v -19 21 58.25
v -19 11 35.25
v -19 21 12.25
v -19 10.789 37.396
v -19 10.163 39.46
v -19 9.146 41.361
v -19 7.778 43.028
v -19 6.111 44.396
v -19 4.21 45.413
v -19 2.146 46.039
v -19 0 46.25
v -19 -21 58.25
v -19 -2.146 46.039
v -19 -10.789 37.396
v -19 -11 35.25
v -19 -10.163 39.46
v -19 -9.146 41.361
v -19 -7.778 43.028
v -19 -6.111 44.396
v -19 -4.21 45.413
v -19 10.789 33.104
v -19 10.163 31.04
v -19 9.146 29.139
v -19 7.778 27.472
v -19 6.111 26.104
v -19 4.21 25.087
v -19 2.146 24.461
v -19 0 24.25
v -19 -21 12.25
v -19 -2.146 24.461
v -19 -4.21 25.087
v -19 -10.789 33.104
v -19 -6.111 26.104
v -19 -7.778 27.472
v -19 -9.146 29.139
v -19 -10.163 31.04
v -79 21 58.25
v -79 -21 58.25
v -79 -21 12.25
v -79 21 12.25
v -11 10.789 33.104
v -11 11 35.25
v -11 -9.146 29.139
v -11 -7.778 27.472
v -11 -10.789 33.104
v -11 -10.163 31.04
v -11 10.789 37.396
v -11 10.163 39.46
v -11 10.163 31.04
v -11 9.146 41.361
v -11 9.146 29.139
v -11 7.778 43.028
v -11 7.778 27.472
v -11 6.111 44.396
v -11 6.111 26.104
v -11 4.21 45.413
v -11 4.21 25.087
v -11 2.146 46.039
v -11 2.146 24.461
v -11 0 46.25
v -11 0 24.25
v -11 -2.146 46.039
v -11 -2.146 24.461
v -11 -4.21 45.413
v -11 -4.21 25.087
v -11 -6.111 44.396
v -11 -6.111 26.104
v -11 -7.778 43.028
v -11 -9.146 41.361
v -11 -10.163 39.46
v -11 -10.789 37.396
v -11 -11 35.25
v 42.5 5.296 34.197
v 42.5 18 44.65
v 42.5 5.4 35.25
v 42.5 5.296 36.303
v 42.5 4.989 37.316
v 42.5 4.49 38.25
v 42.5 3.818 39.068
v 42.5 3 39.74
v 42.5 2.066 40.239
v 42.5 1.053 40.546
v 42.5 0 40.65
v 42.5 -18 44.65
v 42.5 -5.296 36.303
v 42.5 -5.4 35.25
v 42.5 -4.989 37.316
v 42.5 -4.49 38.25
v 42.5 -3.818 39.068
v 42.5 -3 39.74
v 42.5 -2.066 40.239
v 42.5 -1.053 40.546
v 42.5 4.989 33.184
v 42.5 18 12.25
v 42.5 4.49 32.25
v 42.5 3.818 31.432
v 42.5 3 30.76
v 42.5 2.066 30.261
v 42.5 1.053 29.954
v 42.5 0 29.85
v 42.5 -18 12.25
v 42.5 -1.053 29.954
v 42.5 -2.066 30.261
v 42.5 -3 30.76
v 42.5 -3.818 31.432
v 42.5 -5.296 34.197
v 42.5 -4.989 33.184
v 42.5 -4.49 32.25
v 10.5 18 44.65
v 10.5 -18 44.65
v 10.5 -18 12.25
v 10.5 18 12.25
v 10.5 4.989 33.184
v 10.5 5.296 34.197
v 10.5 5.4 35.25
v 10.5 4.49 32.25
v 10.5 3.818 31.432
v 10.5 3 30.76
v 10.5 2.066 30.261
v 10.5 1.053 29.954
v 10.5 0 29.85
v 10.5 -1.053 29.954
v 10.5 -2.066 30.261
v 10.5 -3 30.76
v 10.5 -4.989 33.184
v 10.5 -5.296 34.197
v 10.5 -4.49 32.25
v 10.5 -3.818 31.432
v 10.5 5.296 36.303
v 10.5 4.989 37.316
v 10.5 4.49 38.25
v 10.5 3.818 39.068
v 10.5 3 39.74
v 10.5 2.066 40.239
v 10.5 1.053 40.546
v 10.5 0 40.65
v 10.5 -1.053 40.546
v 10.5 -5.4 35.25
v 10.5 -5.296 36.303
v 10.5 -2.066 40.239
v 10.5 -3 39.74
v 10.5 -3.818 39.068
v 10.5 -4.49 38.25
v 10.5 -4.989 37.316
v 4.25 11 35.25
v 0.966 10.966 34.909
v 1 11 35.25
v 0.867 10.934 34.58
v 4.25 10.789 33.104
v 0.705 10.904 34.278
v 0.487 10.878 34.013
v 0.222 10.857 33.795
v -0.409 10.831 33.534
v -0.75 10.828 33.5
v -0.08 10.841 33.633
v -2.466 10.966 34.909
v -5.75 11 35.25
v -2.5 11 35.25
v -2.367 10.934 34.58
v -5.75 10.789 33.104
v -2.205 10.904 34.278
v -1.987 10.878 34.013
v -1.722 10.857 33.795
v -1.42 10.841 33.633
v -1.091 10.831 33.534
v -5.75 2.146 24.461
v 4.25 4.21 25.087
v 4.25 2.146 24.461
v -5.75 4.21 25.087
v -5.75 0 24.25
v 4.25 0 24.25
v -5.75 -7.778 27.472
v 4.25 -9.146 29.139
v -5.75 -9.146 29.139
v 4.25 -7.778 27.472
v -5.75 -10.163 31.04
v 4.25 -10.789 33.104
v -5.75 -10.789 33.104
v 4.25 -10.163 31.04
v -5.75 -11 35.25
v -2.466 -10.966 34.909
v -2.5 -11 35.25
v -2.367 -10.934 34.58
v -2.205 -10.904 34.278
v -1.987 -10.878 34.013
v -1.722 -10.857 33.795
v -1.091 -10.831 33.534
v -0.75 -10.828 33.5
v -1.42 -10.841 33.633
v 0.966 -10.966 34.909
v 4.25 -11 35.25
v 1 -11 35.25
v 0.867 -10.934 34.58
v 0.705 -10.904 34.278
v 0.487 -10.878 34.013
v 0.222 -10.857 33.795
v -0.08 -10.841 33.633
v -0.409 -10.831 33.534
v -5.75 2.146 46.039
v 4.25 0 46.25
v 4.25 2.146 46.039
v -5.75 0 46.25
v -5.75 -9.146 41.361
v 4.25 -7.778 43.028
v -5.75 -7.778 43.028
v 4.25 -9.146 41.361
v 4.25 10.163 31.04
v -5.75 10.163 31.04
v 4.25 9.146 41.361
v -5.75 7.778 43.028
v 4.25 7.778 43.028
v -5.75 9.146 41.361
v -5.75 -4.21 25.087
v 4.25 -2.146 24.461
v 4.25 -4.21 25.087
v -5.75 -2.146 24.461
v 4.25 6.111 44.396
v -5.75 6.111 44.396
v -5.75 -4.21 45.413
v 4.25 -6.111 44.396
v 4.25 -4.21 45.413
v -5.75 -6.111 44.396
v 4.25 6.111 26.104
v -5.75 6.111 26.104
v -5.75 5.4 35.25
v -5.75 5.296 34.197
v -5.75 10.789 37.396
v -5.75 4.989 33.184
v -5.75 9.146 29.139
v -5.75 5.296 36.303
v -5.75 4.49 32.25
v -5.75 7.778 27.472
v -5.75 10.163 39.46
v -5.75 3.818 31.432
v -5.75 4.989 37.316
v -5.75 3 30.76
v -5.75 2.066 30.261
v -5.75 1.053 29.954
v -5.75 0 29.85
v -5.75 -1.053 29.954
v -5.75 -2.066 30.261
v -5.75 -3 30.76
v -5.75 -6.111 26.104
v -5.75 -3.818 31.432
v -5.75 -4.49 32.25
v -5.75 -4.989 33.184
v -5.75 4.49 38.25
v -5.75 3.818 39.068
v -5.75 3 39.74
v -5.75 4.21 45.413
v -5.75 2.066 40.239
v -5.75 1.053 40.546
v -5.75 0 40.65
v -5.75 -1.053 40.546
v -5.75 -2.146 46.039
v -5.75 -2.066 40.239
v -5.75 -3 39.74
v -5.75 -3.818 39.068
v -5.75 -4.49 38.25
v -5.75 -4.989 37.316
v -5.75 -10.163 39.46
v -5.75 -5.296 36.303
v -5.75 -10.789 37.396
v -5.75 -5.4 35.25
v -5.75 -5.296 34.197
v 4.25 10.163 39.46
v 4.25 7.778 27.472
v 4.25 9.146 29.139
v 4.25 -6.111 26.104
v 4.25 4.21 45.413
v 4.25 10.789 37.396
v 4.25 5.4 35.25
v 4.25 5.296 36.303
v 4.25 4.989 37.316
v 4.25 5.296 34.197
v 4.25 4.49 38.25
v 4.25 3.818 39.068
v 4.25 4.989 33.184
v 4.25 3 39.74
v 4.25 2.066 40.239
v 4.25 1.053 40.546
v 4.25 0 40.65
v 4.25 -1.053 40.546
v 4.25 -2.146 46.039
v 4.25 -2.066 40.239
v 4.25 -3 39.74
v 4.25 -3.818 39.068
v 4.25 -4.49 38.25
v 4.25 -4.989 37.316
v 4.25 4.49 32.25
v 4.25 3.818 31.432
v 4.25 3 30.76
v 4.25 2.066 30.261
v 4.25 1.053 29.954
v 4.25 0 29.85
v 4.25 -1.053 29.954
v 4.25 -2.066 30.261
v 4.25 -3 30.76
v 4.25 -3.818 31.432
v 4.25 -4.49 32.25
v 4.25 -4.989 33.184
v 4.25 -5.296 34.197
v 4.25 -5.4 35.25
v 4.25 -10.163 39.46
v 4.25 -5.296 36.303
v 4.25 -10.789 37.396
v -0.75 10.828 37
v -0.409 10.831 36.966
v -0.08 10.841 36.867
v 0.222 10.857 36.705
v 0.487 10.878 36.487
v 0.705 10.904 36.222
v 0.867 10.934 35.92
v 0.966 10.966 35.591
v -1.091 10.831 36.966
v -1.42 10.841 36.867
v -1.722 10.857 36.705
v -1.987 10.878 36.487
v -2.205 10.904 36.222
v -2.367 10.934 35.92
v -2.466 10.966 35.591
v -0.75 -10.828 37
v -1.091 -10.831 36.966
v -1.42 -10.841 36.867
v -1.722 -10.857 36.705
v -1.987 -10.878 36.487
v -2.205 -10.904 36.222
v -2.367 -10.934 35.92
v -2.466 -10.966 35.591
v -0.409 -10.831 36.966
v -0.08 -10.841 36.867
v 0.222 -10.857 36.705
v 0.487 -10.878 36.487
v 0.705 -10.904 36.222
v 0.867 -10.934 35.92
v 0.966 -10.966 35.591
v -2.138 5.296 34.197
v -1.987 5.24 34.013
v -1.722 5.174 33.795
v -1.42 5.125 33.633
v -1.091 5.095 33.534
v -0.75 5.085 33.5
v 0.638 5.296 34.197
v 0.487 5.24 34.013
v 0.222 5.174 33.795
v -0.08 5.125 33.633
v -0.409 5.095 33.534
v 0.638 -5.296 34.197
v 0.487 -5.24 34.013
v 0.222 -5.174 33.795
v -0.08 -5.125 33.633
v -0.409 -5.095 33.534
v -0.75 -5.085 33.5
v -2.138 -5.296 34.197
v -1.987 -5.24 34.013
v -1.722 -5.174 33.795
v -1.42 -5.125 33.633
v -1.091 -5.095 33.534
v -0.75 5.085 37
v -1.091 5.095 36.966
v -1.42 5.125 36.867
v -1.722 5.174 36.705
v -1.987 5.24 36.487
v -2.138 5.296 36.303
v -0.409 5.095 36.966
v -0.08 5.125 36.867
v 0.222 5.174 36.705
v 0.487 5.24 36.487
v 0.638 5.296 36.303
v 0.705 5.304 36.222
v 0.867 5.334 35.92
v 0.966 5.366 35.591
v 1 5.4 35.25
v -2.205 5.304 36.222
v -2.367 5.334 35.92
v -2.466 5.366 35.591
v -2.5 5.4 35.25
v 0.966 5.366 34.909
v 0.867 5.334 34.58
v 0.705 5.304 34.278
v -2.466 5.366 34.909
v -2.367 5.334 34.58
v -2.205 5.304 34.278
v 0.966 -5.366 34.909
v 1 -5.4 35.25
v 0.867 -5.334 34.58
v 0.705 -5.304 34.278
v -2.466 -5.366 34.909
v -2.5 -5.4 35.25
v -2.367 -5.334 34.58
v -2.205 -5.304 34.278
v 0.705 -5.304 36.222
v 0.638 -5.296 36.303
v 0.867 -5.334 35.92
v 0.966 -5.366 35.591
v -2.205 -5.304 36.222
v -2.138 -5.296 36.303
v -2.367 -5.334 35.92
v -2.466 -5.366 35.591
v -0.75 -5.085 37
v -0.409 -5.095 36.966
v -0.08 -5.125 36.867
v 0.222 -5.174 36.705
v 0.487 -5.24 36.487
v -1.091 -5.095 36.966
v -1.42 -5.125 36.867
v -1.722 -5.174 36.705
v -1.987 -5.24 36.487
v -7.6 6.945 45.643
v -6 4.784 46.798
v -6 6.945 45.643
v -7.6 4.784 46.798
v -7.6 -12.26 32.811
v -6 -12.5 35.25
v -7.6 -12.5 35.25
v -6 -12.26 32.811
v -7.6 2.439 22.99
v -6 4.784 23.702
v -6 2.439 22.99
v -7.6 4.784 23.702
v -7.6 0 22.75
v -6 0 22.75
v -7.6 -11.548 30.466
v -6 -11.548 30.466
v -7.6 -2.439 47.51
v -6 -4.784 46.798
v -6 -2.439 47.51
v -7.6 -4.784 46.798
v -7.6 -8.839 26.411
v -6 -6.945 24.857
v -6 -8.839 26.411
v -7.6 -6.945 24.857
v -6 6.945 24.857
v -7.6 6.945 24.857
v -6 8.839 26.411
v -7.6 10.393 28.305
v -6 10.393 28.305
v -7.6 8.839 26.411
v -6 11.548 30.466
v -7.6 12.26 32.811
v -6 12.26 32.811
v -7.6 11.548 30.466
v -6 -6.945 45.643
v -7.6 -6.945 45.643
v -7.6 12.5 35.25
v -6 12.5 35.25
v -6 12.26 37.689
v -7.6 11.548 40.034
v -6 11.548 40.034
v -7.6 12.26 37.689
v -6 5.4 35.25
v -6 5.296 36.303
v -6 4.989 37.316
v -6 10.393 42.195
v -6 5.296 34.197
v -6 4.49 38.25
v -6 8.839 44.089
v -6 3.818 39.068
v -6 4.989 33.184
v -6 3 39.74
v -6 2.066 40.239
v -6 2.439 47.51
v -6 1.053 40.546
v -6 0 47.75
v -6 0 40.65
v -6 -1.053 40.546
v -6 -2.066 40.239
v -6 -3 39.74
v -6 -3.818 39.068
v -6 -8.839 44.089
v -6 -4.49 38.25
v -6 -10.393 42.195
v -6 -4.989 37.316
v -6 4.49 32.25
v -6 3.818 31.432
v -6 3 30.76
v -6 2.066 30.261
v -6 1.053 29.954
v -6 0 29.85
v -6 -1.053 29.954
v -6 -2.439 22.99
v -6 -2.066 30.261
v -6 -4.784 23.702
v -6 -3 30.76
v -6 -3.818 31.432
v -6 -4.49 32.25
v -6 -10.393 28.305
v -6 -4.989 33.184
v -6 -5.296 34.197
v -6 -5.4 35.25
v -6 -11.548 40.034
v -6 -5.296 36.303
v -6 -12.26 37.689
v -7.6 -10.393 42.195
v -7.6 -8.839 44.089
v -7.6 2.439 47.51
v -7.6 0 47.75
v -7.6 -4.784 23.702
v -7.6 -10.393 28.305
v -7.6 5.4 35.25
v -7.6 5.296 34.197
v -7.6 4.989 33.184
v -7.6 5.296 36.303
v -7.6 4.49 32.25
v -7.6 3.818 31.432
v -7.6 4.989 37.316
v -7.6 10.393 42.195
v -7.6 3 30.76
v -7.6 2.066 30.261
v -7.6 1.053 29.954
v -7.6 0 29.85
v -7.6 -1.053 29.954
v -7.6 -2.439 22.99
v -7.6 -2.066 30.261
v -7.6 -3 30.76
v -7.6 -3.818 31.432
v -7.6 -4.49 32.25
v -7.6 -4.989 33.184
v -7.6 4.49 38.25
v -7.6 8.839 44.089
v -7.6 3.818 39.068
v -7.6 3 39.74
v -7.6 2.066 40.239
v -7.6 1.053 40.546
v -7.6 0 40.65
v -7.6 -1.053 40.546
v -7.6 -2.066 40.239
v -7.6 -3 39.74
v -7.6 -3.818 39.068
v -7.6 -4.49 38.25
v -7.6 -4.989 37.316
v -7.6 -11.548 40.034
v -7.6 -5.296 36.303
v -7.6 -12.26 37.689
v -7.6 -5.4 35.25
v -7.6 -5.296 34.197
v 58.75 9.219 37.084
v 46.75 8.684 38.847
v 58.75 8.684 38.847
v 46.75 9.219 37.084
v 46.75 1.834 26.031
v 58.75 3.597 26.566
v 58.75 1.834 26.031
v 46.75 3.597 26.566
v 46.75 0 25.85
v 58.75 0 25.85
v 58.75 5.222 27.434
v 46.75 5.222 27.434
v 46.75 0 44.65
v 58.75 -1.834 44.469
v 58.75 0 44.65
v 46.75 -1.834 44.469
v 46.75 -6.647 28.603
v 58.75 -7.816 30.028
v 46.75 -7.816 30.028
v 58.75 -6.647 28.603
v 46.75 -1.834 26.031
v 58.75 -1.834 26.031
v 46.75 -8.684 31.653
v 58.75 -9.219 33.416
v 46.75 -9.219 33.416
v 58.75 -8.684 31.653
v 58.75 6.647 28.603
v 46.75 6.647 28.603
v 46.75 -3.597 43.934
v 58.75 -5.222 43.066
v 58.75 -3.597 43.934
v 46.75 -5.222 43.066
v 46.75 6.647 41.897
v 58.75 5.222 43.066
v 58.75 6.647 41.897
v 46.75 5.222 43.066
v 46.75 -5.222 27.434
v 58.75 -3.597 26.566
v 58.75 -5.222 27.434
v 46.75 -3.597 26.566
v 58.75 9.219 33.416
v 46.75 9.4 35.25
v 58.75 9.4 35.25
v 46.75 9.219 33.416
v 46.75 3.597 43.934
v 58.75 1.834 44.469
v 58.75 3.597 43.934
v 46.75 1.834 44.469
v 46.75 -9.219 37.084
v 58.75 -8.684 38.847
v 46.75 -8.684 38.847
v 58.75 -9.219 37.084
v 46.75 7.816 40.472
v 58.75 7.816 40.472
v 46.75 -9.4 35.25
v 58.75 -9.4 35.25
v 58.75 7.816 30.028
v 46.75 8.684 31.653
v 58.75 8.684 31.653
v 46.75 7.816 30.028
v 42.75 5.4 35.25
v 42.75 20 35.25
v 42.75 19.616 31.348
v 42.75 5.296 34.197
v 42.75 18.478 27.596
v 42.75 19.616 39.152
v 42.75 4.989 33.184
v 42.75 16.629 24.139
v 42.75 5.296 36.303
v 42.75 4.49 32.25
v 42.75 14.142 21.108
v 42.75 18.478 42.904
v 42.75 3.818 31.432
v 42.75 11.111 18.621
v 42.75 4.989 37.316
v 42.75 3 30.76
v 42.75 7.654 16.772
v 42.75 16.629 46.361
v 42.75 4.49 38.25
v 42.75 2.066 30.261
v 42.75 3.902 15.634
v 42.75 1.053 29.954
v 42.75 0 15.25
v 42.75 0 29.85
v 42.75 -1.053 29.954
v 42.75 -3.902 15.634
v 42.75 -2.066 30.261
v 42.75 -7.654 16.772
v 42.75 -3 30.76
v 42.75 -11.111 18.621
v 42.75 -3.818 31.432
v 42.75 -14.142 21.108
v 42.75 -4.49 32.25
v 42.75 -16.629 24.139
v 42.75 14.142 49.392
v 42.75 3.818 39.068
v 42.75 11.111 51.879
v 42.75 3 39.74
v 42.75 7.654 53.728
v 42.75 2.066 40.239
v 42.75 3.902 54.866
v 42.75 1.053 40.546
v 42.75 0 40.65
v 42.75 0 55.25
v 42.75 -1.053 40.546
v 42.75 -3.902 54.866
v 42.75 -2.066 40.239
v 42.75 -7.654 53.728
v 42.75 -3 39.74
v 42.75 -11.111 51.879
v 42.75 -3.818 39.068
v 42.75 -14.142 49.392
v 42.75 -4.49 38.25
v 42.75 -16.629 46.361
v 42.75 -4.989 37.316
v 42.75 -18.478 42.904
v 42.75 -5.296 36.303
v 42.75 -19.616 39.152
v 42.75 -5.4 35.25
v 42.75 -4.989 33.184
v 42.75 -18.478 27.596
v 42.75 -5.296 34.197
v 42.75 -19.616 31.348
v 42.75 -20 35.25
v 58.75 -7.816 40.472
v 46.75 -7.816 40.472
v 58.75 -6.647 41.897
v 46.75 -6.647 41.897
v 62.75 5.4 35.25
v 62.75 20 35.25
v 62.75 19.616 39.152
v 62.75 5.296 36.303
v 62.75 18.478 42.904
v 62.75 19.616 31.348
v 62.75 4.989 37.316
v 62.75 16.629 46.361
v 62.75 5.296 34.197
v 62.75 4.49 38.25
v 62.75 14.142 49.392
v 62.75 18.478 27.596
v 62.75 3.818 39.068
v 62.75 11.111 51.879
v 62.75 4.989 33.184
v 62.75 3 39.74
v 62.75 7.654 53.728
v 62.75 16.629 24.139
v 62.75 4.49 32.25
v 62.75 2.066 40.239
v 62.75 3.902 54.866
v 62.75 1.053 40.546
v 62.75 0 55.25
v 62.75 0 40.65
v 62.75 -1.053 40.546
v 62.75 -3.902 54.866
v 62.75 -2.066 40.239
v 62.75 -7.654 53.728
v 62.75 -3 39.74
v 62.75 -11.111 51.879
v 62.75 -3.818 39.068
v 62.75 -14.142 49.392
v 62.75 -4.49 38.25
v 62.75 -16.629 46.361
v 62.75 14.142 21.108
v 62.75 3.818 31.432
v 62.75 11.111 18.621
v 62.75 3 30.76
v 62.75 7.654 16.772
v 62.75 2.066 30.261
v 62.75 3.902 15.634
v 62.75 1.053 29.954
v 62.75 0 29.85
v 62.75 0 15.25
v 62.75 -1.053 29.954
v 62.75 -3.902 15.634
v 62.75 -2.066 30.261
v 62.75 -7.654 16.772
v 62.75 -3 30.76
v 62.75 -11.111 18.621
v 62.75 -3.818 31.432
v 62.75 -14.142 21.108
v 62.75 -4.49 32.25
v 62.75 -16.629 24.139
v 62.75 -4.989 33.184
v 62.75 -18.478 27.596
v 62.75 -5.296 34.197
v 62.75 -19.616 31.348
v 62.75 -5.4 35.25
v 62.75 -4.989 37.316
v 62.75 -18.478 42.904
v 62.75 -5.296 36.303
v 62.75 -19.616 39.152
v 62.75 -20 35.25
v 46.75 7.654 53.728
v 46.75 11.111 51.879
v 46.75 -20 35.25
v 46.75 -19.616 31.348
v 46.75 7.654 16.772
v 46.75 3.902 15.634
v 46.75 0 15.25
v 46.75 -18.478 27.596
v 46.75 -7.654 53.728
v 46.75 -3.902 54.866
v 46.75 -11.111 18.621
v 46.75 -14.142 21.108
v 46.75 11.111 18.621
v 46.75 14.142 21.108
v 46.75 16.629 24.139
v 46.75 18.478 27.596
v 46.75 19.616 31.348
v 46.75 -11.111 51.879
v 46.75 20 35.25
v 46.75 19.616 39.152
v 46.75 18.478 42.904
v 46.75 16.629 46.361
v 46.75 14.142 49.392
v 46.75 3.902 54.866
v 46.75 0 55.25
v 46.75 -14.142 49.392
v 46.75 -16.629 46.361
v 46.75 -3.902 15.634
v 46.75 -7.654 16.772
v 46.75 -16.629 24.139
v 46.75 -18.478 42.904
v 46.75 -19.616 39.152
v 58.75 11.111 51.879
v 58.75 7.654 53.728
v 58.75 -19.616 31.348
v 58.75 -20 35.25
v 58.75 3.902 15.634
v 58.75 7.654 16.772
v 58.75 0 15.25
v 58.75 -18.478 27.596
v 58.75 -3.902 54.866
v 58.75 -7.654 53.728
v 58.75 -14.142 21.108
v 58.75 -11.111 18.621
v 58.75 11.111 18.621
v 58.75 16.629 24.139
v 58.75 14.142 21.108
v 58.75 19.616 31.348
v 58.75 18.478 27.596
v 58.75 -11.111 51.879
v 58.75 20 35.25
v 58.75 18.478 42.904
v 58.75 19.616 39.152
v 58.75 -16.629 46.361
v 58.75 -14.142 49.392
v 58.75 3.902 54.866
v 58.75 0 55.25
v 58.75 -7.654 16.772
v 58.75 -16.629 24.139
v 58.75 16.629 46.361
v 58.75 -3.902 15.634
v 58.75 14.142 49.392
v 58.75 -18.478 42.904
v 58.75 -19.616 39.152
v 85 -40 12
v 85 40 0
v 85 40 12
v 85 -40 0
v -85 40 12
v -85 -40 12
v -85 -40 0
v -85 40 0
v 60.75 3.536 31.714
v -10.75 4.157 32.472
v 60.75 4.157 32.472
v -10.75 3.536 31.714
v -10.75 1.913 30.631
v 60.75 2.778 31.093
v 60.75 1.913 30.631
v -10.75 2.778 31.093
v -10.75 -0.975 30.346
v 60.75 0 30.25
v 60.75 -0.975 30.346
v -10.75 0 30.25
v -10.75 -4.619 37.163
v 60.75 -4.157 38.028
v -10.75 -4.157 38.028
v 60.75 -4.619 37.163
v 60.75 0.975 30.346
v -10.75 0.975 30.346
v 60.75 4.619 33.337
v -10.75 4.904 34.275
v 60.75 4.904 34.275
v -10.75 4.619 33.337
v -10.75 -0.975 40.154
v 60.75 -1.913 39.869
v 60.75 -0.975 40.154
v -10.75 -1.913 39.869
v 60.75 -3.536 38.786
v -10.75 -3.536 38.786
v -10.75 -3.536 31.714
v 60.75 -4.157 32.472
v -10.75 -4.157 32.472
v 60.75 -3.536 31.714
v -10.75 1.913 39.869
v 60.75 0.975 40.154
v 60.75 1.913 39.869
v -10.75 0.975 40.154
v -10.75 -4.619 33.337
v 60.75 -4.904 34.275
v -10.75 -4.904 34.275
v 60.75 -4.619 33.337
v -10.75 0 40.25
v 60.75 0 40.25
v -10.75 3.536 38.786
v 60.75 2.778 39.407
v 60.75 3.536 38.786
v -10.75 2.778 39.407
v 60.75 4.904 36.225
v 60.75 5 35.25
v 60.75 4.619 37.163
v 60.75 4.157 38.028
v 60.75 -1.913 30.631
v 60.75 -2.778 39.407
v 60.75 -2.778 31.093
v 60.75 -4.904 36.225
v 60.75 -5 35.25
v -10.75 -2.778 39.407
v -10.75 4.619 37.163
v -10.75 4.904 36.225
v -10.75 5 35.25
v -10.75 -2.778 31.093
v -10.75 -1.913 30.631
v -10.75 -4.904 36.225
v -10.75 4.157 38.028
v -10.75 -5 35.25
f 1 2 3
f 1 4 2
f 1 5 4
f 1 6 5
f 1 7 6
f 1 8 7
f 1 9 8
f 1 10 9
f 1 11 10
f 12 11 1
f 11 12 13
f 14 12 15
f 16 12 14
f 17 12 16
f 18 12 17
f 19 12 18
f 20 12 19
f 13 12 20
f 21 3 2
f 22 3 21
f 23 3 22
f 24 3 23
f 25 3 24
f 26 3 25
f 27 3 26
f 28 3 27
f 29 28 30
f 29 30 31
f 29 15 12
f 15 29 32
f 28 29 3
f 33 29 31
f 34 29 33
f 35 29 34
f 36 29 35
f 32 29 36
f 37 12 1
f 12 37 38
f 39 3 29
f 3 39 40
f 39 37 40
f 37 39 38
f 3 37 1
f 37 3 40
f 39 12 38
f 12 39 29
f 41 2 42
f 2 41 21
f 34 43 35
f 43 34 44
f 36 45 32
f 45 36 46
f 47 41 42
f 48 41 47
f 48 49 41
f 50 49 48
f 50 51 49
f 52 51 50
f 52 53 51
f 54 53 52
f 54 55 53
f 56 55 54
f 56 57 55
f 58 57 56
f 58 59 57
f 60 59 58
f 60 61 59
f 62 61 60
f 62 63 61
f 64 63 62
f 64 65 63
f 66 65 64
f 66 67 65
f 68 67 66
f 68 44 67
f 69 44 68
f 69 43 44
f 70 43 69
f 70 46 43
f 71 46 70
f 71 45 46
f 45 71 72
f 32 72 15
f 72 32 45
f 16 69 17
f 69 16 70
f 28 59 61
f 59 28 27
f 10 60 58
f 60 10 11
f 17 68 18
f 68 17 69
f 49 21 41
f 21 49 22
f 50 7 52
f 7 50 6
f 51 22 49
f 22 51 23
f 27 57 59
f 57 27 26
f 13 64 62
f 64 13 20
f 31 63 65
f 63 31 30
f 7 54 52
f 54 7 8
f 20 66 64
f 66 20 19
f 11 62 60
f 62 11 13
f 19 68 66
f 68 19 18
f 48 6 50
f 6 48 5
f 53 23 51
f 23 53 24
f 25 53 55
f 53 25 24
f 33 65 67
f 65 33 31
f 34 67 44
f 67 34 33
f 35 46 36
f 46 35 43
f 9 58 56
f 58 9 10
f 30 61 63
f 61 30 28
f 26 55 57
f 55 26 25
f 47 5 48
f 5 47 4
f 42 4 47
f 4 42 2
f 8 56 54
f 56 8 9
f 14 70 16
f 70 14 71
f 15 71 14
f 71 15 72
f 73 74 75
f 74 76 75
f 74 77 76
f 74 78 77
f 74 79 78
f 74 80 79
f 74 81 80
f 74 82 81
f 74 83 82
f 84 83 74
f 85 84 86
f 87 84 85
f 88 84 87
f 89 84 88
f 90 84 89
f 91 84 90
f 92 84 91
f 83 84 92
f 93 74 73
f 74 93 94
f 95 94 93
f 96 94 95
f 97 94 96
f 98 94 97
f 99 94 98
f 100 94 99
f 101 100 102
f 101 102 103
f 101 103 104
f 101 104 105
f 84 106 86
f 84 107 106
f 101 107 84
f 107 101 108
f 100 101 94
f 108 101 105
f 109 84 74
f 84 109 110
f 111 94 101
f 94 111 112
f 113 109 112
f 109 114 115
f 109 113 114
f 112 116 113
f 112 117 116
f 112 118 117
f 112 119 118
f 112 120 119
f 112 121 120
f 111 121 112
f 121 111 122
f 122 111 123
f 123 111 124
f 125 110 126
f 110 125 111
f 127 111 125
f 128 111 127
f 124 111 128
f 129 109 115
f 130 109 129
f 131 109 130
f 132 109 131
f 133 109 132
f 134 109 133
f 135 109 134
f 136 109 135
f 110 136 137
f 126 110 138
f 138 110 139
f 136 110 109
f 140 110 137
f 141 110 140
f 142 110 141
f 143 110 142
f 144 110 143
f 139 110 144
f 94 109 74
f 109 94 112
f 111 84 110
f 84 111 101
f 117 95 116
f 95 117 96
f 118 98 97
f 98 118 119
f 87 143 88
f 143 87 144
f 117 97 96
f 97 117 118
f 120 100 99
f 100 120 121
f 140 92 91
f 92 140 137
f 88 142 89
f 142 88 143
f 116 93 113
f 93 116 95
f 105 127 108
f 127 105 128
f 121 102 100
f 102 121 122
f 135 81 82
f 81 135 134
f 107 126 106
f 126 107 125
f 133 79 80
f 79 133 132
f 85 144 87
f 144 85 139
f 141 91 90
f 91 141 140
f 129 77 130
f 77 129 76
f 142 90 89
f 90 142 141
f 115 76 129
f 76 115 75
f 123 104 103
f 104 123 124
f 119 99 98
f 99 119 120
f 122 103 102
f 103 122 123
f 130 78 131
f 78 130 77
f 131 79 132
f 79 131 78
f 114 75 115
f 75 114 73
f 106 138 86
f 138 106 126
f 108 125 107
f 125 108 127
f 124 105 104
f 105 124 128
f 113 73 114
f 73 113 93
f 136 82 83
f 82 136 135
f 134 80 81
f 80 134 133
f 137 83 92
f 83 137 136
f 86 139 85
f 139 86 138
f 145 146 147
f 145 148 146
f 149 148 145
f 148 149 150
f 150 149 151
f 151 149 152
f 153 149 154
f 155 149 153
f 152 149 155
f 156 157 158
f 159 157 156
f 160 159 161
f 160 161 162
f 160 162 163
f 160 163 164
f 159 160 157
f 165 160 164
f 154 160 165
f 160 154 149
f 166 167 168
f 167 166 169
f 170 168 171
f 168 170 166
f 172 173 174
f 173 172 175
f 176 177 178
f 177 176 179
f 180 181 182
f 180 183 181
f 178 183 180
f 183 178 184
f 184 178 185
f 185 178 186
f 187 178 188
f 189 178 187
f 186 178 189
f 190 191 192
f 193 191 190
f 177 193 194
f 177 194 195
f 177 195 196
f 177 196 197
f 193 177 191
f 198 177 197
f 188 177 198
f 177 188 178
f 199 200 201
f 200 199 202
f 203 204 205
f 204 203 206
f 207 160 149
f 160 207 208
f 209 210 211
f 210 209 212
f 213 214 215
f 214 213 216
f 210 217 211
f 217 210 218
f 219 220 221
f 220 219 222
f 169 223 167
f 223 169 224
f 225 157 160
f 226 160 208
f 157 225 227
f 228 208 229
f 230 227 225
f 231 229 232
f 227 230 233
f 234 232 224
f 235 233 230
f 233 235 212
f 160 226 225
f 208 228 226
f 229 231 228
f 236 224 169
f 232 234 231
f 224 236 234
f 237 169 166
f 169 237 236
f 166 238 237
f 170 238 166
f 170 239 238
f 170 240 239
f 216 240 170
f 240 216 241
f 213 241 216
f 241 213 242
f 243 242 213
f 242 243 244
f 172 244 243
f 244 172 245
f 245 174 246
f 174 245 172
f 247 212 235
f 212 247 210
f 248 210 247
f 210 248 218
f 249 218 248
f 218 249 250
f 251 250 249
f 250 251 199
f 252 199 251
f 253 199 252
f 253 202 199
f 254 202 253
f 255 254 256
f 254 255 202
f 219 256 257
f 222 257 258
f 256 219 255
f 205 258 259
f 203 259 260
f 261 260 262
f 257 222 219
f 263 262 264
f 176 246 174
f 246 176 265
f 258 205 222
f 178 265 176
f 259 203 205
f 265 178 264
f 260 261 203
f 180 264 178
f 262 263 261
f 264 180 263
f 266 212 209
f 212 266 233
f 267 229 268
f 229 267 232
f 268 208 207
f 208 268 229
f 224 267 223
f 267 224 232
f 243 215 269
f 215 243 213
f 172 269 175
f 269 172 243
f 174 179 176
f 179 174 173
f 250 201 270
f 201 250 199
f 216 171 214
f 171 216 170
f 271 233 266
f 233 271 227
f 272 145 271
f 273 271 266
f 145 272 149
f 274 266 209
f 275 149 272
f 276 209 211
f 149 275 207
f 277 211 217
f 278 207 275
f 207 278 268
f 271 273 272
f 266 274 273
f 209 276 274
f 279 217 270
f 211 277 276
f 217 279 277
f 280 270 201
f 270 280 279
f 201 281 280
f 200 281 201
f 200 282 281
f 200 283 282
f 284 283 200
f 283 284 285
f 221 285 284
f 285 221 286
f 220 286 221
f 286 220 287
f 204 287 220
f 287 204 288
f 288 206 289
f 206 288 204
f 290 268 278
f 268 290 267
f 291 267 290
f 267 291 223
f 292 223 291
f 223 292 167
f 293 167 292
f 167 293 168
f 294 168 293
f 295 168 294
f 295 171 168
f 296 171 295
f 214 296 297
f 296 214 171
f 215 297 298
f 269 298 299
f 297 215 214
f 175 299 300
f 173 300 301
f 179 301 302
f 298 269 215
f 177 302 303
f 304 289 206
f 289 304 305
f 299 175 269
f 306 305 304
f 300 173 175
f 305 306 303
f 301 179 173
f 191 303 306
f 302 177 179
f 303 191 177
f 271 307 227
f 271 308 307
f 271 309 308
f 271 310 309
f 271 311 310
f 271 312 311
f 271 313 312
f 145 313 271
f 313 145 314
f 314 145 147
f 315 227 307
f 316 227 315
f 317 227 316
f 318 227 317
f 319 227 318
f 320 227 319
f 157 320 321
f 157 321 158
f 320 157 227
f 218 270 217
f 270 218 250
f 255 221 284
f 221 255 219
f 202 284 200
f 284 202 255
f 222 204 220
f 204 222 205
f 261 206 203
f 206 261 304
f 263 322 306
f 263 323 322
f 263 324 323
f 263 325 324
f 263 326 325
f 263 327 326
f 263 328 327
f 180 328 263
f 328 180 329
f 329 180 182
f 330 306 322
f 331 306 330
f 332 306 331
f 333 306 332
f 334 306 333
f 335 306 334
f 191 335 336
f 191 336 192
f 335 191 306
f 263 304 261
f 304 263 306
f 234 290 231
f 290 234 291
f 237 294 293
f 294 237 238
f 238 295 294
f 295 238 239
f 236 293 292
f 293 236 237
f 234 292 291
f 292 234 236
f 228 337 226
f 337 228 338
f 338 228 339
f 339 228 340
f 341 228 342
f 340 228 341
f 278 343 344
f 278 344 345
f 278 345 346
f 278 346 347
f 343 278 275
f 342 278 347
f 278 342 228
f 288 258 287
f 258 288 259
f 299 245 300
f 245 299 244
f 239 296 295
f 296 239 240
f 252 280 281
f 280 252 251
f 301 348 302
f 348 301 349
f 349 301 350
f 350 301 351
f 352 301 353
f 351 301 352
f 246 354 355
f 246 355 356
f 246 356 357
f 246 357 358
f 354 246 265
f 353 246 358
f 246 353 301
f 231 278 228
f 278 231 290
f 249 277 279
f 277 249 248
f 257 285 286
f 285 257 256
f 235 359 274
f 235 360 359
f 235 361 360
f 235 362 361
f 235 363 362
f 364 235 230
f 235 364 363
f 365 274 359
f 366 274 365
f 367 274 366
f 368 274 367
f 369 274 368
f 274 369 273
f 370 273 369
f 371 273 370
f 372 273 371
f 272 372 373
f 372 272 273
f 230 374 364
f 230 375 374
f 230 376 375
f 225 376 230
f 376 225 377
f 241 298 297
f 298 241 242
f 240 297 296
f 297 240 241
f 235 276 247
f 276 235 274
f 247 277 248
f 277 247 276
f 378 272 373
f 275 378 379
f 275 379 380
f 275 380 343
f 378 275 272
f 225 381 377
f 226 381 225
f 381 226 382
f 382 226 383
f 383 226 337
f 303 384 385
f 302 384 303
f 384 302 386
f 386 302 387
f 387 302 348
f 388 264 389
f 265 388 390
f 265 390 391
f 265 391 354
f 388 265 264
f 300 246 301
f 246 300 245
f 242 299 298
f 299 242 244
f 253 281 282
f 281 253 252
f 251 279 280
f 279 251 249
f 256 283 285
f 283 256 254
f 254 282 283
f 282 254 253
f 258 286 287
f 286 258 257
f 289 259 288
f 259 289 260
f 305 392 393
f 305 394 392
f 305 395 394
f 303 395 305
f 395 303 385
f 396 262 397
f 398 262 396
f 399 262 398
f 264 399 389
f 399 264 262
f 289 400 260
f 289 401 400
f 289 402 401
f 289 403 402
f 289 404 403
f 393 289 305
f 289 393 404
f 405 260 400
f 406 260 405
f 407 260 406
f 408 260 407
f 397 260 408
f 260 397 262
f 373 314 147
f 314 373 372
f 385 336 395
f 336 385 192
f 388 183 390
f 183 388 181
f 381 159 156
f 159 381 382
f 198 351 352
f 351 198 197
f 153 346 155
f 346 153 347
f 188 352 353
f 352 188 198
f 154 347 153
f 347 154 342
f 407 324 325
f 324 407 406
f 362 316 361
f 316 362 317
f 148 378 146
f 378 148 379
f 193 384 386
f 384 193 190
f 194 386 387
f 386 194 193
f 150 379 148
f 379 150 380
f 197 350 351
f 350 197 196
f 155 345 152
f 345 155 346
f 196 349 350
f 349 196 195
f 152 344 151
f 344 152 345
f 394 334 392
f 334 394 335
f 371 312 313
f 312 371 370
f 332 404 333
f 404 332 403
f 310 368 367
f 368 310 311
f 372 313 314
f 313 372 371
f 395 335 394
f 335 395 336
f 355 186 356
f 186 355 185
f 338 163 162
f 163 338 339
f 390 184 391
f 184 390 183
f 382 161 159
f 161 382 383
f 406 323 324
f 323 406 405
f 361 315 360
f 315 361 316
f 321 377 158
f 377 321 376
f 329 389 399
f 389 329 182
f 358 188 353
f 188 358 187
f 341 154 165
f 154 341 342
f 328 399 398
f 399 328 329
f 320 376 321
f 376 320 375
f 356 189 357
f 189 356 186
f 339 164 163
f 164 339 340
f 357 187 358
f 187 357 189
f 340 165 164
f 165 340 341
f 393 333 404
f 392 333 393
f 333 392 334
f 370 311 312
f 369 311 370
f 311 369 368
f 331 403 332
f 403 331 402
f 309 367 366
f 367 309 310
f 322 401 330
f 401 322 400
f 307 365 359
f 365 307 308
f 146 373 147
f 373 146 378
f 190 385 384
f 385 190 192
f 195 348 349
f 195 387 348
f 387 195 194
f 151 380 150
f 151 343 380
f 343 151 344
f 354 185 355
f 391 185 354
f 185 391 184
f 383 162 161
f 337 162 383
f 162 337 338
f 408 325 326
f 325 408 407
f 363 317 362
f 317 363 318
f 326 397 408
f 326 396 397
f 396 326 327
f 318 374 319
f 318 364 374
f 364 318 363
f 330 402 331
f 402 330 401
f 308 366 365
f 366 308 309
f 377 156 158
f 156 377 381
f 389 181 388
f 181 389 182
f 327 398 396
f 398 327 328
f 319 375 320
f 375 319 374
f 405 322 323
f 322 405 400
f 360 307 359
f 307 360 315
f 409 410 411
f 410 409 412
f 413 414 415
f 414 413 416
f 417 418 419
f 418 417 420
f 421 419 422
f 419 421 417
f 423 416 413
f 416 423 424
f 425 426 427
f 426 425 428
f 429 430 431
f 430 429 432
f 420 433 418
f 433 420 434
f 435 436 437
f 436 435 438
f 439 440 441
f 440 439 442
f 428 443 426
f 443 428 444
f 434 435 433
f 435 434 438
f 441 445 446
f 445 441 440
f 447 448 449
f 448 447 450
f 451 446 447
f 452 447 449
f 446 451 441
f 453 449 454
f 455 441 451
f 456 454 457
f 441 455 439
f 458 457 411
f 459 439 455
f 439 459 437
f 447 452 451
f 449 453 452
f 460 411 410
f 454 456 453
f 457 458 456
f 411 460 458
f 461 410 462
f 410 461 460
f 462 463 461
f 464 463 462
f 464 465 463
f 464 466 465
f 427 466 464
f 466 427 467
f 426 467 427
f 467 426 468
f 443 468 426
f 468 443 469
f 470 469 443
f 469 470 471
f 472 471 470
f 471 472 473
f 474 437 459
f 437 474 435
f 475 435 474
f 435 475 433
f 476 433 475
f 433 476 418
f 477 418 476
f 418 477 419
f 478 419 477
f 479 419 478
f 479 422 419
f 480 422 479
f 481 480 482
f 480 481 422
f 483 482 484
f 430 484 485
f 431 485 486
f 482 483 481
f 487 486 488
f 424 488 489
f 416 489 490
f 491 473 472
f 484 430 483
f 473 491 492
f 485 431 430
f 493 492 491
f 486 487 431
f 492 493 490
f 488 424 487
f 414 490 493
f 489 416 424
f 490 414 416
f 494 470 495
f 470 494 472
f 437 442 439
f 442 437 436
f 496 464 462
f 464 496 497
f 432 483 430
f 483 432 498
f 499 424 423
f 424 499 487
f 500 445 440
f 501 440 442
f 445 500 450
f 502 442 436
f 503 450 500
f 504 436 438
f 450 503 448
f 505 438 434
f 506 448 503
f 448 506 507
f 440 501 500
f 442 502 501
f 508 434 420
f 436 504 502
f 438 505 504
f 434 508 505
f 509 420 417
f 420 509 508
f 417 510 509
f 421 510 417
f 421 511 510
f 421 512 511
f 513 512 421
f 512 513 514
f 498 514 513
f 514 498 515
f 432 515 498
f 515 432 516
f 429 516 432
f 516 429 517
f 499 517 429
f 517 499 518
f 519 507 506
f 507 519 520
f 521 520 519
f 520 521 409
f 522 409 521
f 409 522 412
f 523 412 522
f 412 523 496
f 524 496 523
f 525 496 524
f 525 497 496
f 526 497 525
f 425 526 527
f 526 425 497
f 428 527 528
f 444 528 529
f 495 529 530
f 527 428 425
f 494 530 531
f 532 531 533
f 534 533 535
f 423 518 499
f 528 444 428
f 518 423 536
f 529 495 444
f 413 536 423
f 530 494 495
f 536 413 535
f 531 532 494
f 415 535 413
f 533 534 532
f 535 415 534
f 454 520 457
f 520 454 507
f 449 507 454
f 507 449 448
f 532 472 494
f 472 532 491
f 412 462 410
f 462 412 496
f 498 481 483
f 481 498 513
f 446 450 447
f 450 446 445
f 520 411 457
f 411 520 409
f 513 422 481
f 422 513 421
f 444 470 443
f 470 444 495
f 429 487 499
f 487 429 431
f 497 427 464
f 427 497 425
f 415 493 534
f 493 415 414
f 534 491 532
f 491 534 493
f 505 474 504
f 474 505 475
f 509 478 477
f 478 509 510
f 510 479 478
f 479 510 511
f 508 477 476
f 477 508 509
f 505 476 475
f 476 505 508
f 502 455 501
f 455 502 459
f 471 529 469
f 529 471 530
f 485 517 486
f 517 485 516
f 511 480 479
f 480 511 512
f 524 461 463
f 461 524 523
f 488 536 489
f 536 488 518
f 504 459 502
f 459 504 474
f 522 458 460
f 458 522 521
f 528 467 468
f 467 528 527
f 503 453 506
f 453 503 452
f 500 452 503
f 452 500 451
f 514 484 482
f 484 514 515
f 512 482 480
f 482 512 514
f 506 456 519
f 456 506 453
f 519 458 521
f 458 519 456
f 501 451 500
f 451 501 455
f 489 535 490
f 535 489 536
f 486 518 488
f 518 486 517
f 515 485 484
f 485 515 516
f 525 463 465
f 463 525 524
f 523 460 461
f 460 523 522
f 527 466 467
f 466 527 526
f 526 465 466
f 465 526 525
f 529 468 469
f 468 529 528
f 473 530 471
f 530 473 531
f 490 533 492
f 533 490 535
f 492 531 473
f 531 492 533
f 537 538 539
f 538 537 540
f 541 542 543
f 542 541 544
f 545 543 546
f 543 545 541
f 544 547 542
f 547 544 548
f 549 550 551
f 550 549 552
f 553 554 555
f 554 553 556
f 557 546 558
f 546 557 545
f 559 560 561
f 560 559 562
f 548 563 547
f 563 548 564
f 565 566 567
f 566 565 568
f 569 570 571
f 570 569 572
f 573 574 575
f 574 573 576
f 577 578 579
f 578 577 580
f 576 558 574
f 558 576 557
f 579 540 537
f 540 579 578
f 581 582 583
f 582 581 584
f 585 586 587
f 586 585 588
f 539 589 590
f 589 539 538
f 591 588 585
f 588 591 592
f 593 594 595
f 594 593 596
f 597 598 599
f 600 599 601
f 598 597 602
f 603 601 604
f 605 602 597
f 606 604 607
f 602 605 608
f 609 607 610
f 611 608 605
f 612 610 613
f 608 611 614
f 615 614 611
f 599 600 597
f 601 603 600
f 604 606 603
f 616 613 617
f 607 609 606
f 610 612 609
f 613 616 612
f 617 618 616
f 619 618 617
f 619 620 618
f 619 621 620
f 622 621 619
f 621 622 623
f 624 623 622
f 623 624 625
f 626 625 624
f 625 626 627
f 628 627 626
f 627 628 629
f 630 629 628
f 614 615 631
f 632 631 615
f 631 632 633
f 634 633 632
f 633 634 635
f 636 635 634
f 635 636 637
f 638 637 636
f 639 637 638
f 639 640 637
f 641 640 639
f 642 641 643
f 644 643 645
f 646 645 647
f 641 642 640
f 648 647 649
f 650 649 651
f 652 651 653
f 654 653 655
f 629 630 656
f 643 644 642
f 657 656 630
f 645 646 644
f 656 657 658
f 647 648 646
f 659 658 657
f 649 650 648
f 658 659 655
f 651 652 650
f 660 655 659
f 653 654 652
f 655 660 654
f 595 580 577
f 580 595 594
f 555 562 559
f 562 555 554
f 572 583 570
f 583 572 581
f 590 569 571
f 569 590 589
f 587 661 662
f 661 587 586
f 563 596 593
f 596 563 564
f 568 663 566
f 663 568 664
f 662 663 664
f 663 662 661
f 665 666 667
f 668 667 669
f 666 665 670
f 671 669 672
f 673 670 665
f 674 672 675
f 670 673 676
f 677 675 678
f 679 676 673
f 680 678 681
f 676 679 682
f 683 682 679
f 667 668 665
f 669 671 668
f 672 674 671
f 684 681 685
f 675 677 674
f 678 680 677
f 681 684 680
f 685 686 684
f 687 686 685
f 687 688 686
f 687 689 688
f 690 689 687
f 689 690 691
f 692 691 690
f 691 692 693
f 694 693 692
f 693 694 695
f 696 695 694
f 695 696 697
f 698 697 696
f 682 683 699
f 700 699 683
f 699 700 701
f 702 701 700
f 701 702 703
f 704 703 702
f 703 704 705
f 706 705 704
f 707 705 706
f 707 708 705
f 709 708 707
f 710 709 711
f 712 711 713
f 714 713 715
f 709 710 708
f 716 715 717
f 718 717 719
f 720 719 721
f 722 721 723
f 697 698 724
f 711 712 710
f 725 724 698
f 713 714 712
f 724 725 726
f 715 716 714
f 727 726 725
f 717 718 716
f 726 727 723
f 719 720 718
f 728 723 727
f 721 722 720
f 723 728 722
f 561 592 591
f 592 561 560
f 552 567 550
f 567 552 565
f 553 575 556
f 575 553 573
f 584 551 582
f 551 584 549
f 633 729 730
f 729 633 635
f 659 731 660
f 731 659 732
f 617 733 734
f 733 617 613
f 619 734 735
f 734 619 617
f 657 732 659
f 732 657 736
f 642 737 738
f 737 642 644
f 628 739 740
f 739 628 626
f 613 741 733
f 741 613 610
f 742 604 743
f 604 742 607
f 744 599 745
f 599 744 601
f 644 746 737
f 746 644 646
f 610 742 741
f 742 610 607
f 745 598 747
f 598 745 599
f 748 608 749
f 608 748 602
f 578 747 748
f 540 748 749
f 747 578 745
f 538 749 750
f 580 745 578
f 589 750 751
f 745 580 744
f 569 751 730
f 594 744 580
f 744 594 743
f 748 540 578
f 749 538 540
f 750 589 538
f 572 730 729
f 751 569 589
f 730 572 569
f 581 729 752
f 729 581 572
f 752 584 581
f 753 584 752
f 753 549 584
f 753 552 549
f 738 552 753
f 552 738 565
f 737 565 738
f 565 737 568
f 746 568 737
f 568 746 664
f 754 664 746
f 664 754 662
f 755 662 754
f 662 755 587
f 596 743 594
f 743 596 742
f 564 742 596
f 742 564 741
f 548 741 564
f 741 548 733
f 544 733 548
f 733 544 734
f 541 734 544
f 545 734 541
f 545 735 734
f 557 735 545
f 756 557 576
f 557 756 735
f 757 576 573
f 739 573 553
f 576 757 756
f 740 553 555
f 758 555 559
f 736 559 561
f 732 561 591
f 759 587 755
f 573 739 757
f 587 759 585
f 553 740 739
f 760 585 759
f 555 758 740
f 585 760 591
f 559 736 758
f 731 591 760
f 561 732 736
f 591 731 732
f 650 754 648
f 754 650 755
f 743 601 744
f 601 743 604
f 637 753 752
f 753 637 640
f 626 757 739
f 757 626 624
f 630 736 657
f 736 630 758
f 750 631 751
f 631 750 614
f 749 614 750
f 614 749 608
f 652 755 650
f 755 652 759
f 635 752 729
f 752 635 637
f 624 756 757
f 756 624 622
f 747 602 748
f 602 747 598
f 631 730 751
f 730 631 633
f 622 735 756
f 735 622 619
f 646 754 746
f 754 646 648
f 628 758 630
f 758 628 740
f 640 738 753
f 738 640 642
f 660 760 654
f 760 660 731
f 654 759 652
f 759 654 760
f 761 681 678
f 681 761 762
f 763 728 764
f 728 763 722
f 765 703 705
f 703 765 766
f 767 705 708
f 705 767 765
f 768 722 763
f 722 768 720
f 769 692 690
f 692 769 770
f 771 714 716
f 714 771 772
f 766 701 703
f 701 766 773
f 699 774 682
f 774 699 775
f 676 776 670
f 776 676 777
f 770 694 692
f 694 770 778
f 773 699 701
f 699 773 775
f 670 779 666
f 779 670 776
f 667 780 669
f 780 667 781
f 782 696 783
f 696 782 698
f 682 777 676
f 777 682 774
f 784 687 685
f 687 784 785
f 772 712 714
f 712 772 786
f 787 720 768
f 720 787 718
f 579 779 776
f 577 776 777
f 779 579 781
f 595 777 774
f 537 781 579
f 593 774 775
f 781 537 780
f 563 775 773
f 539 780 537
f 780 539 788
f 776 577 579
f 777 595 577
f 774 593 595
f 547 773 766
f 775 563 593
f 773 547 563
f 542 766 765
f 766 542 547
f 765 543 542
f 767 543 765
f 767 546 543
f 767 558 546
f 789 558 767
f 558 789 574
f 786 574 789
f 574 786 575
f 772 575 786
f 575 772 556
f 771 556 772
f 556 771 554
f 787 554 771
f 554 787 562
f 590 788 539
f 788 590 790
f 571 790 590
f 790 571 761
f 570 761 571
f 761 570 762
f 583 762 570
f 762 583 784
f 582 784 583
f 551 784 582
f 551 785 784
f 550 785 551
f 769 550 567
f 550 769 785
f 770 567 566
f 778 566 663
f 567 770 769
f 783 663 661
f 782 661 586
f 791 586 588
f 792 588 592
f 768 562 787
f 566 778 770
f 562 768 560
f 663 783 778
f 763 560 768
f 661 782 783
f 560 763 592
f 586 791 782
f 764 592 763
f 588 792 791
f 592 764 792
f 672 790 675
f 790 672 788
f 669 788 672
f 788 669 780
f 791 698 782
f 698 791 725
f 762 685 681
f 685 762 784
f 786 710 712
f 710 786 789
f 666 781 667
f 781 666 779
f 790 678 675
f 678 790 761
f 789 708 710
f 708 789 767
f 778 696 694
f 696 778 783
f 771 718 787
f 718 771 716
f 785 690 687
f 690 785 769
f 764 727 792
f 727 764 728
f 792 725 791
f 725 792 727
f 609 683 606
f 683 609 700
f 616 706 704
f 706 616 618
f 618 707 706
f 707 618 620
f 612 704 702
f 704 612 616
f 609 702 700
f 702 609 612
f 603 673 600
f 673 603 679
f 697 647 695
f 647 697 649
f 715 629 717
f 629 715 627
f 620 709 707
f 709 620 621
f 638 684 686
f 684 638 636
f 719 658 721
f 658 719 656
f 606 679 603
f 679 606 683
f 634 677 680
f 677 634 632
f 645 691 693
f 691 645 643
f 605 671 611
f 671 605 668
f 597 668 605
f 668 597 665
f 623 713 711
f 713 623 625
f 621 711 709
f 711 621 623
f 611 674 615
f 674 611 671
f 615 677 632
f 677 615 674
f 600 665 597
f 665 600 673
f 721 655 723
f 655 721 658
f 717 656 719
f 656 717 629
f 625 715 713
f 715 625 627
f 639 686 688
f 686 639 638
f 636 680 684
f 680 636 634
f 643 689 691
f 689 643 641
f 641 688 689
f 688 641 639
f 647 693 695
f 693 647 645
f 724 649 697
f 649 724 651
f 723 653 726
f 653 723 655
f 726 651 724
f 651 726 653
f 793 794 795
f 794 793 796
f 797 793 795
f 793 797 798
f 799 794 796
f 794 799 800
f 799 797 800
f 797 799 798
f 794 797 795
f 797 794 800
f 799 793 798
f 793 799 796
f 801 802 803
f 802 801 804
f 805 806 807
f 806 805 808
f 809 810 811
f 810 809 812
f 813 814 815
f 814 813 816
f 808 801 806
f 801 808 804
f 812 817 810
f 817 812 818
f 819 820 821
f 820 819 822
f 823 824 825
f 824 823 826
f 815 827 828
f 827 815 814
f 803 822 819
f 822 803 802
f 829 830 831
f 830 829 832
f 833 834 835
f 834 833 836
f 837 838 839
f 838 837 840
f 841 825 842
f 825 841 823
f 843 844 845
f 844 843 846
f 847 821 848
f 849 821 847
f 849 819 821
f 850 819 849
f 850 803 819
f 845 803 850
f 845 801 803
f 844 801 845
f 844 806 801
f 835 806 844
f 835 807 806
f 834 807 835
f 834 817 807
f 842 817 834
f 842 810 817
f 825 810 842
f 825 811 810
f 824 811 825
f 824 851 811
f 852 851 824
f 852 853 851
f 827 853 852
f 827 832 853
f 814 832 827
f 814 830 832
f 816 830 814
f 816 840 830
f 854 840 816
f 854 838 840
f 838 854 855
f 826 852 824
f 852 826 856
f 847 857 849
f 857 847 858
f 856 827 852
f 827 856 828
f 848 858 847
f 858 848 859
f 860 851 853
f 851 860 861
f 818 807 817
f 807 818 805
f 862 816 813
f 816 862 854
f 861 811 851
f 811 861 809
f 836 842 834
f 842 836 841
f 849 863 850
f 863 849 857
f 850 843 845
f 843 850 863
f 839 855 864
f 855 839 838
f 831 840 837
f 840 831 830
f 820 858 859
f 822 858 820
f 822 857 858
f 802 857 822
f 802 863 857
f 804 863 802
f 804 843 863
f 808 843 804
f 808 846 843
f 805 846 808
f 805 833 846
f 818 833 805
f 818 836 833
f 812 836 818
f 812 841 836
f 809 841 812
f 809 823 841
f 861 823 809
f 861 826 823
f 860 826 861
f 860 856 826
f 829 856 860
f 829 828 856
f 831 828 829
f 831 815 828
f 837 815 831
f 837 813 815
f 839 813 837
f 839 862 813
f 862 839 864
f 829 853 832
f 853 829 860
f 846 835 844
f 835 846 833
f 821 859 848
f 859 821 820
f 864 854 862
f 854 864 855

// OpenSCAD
$fn = 32;

// ------------------------------------------------------------------------
// Motor drive station: motor 60 x 46 mm, shaft d10, pulley d40
// Every part is its own module, assembly() places every instance.
// ------------------------------------------------------------------------

// --- part 1 ---
module station_bed() {
  difference() {
    translate([-85, -40, 0]) cube([170, 80, 12]);
  }
}

// --- part 2 ---
module drive_motor() {
  union() {
    translate([-30, -21, 0]) cube([60, 42, 46]);
    translate([34, 0, 23]) rotate([0, 90, 0]) cylinder(h = 8, d = 22, center = true);
  }
}

// --- part 3 ---
module pillow_block() {
  difference() {
    translate([-16, -18, 0]) cube([32, 36, 32.4]);
    translate([0, 0, 23]) rotate([0, 90, 0]) cylinder(h = 34, d = 10.8, center = true);
  }
}

// --- part 4 ---
module drive_shaft() {
  translate([0, 0, -35.75]) cylinder(h = 71.5, d = 10);
}

// --- part 5 ---
module shaft_collar() {
  difference() {
    cylinder(h = 10, d = 22);
    translate([0, 0, -1]) cylinder(h = 12, d = 10.8);
    translate([0, 0, 5]) rotate([90, 0, 0]) cylinder(h = 24, d = 3.5, center = true);
  }
}

// --- part 6 ---
module collar_washer() {
  difference() {
      translate([0, 0, 0]) cylinder(h = 1.6, d = 25);
      translate([0, 0, -1]) cylinder(h = 3.6, d = 10.8);
    }
}

// --- part 7 ---
module drive_pulley() {
  difference() {
    union() {
      cylinder(h = 20, d = 18.8);
      cylinder(h = 4, d = 40);
      translate([0, 0, 16]) cylinder(h = 4, d = 40);
    }
    translate([0, 0, -1]) cylinder(h = 22, d = 10.8);
  }
}

// --- assembly ---
module assembly() {
  color([0.80, 0.24, 0.20]) translate([0, 0, 0]) rotate([0, 0, 0]) station_bed();
  color([0.20, 0.45, 0.75]) translate([-49, 0, 12.25]) rotate([0, 0, 0]) drive_motor();
  color([0.25, 0.62, 0.32]) translate([26.5, 0, 12.25]) rotate([0, 0, 0]) pillow_block();
  color([0.92, 0.70, 0.18]) translate([25, 0, 35.25]) rotate([0, 90, 0]) drive_shaft();
  color([0.58, 0.35, 0.70]) translate([-5.75, 0, 35.25]) rotate([0, 90, 0]) shaft_collar();
  color([0.16, 0.66, 0.66]) translate([-7.6, 0, 35.25]) rotate([0, 90, 0]) collar_washer();
  color([0.85, 0.48, 0.18]) translate([42.75, 0, 35.25]) rotate([0, 90, 0]) drive_pulley();
}

assembly();
